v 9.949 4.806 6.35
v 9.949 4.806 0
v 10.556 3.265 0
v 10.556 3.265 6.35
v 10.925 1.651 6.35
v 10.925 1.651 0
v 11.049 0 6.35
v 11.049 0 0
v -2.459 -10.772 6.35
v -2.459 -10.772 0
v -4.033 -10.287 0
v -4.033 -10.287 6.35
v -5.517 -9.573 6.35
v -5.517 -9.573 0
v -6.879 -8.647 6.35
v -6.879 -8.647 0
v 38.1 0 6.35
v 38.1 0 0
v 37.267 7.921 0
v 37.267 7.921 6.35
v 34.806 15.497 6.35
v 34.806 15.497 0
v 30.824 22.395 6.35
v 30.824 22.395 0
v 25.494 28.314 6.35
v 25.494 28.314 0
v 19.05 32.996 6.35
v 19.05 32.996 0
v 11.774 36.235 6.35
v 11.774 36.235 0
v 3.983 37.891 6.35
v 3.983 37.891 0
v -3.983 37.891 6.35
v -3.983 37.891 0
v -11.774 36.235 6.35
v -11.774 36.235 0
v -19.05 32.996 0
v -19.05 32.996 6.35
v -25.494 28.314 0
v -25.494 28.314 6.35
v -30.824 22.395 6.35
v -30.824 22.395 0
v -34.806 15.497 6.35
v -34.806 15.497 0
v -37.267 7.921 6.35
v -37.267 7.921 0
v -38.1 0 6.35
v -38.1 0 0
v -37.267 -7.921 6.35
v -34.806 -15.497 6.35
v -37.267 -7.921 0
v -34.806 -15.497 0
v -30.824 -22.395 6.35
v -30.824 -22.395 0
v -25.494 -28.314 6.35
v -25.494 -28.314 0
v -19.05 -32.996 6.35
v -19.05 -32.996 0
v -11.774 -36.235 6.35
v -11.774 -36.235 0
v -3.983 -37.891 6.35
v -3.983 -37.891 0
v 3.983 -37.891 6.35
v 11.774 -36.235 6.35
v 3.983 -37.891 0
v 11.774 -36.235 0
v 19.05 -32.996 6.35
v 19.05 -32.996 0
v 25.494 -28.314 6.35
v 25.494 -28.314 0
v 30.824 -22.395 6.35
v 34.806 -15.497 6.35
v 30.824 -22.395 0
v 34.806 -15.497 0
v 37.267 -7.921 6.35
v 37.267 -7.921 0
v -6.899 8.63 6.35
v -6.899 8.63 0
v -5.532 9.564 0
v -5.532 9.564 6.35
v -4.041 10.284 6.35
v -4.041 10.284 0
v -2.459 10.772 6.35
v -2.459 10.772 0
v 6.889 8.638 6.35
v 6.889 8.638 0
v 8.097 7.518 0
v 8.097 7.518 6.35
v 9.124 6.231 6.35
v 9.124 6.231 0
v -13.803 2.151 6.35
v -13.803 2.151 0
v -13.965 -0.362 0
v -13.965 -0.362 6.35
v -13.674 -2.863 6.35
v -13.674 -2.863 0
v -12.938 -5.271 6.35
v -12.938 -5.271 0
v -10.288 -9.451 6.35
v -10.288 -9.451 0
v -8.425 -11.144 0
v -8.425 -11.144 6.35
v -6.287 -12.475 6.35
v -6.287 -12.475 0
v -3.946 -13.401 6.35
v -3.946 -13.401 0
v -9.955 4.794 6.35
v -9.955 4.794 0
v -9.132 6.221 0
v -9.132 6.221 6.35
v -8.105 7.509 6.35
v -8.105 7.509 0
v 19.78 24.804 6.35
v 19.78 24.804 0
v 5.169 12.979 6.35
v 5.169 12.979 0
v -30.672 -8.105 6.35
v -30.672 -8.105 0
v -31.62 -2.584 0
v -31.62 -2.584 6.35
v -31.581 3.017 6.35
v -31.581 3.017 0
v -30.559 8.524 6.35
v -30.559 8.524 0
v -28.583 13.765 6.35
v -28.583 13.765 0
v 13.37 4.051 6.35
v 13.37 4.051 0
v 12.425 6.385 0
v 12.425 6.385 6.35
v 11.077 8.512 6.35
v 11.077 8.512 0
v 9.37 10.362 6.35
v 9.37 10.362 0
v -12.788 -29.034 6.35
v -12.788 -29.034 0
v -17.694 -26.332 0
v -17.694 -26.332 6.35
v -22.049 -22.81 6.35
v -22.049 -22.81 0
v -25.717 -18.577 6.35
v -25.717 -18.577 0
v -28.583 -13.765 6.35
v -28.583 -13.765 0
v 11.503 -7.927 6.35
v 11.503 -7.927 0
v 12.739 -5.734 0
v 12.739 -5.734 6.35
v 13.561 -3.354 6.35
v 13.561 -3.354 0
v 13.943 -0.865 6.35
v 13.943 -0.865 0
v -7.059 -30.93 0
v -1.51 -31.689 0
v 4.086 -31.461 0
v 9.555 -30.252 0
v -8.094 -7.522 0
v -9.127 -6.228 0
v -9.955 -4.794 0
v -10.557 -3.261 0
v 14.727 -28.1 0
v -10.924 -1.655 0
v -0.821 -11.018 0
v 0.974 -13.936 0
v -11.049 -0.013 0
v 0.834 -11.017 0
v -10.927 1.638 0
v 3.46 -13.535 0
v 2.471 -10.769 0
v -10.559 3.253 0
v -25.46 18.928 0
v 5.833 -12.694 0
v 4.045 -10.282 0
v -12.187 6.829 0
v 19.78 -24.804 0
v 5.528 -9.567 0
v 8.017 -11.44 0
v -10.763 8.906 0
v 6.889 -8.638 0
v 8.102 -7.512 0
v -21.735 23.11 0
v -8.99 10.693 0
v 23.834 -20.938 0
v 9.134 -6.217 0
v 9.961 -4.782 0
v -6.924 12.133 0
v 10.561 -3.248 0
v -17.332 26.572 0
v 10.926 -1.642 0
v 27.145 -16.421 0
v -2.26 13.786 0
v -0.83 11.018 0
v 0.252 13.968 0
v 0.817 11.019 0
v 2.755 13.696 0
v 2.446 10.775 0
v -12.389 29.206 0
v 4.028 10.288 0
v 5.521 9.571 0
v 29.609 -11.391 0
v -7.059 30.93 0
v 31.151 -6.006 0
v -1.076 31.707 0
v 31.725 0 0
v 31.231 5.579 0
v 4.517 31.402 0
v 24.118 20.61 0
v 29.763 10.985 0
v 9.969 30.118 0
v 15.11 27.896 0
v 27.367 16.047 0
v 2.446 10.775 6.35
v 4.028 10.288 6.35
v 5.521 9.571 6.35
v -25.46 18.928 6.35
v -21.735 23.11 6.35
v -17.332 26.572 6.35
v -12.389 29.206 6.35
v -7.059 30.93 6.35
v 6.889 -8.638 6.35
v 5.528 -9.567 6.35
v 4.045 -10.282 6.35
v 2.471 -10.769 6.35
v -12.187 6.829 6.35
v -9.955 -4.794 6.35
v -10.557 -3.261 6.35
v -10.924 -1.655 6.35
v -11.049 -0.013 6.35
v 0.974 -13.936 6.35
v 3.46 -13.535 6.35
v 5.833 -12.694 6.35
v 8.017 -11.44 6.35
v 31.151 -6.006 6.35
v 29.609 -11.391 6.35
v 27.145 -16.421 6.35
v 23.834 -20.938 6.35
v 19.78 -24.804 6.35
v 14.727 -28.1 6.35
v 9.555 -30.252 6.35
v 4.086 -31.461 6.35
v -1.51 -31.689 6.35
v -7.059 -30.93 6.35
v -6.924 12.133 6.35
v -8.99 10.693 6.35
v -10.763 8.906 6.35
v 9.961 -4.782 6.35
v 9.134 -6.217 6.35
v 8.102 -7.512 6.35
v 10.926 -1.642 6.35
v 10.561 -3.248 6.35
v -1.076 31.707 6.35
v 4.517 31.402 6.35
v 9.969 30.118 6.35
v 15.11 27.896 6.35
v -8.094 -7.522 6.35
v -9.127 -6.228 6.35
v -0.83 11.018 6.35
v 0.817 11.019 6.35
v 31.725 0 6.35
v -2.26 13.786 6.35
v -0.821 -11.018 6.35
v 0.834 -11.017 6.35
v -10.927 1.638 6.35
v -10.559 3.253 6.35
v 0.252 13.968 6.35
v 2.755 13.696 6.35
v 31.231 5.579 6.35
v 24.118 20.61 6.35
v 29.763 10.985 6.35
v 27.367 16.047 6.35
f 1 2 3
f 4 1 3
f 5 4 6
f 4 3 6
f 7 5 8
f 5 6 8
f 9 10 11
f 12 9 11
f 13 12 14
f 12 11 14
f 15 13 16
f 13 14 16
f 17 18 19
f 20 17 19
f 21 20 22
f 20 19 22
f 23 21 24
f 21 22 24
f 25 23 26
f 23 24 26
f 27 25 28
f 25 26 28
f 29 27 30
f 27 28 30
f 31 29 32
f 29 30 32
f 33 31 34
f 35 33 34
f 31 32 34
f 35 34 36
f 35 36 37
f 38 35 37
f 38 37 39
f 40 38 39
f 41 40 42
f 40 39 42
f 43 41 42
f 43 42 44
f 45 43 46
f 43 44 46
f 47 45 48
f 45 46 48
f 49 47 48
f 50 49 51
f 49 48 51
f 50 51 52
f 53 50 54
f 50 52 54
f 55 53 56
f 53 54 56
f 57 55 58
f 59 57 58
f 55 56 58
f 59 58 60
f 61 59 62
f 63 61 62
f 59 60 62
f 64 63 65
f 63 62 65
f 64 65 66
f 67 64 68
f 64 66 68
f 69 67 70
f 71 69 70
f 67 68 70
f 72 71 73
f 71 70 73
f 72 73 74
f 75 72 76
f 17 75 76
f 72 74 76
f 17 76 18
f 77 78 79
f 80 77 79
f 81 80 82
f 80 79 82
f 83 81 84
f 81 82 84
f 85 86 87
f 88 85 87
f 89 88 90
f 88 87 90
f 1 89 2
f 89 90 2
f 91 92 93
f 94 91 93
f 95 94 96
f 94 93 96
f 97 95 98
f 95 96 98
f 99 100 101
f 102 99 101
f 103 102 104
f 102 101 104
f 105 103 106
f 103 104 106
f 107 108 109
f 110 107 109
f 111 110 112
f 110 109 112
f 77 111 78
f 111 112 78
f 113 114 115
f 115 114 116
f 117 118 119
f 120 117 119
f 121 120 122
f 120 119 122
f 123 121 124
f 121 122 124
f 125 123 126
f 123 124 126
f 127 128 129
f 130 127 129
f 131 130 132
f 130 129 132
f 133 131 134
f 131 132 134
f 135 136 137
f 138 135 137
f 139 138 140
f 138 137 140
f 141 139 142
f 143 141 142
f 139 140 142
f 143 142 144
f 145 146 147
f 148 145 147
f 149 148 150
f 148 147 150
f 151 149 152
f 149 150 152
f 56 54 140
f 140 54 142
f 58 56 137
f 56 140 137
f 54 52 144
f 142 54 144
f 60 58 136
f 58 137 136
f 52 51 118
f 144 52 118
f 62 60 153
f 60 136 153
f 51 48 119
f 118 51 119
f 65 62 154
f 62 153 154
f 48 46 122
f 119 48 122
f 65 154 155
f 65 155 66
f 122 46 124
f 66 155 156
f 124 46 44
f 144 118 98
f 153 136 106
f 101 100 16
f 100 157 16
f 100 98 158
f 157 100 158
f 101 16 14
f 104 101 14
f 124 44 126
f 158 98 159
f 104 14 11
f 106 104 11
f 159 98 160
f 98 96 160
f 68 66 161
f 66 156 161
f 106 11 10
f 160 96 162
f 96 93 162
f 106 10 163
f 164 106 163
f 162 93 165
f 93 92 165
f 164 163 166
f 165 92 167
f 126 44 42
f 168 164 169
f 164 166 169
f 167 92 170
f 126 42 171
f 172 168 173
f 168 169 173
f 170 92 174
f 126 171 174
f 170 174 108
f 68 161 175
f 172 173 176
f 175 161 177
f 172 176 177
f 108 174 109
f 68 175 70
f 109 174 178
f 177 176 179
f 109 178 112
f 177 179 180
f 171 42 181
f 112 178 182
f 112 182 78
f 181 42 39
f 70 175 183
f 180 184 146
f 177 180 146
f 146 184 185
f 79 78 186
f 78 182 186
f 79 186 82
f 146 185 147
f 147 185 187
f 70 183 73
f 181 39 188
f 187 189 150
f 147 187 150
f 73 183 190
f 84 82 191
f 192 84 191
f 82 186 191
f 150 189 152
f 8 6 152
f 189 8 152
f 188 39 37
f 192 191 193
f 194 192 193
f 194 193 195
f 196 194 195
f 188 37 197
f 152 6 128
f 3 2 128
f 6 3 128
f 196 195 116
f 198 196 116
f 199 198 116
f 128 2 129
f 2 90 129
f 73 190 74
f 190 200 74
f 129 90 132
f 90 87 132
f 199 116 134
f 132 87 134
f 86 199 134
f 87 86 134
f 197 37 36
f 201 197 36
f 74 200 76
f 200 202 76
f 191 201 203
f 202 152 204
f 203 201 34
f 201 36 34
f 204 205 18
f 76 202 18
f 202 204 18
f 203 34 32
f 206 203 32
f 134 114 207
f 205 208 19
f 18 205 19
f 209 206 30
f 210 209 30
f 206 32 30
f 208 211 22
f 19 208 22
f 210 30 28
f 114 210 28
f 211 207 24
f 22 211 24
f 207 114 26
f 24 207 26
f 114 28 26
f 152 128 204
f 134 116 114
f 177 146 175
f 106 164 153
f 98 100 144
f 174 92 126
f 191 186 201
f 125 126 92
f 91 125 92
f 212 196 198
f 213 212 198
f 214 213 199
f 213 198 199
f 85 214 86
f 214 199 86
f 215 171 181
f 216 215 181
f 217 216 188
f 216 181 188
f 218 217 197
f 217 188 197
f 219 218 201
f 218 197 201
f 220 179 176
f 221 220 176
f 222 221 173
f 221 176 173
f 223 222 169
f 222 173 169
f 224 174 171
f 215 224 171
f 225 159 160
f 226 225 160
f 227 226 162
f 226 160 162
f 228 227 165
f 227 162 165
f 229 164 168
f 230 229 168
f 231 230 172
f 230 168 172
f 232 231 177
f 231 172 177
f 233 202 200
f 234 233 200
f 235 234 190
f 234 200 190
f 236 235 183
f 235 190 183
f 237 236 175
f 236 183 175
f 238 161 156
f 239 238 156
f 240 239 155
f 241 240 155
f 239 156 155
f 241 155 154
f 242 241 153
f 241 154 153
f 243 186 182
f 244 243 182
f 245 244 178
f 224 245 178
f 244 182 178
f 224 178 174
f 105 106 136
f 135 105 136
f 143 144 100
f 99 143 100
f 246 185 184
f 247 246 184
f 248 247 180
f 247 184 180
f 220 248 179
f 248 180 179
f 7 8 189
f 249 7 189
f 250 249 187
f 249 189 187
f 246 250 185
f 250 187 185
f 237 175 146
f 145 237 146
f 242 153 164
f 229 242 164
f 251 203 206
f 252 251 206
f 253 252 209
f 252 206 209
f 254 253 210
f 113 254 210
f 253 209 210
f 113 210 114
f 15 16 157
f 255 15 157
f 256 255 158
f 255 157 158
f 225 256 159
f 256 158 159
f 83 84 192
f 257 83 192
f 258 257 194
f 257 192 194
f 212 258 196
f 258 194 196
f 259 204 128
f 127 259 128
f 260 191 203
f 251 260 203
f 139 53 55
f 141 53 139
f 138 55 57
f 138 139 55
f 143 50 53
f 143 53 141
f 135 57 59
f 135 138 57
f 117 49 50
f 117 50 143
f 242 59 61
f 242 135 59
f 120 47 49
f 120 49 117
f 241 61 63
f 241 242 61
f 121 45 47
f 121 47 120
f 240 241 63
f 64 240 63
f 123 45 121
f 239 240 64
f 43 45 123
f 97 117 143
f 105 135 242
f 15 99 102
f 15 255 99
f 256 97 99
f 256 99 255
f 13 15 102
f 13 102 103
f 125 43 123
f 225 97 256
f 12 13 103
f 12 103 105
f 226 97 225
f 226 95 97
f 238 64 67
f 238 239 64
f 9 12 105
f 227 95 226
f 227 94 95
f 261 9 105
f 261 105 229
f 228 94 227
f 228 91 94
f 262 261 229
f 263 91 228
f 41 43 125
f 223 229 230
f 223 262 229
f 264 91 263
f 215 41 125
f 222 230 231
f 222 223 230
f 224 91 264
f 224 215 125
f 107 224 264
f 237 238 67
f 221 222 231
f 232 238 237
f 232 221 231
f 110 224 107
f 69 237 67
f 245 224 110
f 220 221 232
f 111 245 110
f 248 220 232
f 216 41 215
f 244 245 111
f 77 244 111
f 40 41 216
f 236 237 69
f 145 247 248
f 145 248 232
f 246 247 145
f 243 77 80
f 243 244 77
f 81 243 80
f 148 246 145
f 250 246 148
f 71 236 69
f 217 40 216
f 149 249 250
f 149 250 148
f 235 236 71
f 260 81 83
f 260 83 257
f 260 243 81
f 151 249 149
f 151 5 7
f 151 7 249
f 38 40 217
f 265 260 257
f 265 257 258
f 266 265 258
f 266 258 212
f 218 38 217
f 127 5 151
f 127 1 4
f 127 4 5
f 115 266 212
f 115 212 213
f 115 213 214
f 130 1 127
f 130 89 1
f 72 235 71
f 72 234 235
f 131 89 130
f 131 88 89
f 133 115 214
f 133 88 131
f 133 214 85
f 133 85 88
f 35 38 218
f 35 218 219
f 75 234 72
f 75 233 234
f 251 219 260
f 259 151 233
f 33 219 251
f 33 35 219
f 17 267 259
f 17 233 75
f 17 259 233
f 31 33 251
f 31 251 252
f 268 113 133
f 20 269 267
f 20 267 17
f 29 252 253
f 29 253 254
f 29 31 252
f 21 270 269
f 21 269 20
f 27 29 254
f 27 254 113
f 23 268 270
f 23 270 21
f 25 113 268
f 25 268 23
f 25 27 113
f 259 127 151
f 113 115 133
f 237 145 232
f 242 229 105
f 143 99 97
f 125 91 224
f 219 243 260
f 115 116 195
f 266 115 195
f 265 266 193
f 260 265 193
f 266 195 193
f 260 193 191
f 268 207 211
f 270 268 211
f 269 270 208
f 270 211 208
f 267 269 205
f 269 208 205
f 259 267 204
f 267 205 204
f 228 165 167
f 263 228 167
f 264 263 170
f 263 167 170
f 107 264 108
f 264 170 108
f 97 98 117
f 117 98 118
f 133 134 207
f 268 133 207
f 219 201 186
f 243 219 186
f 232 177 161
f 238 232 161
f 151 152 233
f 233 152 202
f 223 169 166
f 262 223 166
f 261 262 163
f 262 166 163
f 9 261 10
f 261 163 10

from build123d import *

# Parameters (mm, degrees)
F0_R     = 38.1
F1_DEPTH = 6.35


with BuildPart() as f1:
    # F0 (on Top) → F1 (new body)
    with BuildSketch(Plane.XY):
        Circle(F0_R)
        with BuildLine():
            ThreePointArc((31.7250303997, 0), (31.5812646245, -3.0168325409), (31.1512702825, -6.0063228058))
            ThreePointArc((31.1512702825, -6.0063228058), (27.1447816525, -16.4206693804), (19.7802329179, -24.8036275488))
            ThreePointArc((19.7802329179, -24.8036275488), (17.3319417654, -26.5721912628), (14.7265670727, -28.0999248419))
            ThreePointArc((14.7265670727, -28.0999248419), (4.0862982493, -31.460764779), (-7.0594833943, -30.9296176515))
            ThreePointArc((-7.0594833943, -30.9296176515), (-9.9686867503, -30.1181479898), (-12.7875415101, -29.033710338))
            ThreePointArc((-12.7875415101, -29.033710338), (-22.049251081, -22.8102626164), (-28.5832647234, -13.7649748135))
            ThreePointArc((-28.5832647234, -13.7649748135), (-29.7626908188, -10.9845249823), (-30.6723705175, -8.1045197699))
            ThreePointArc((-30.6723705175, -8.1045197699), (-31.5812646245, 3.0168325409), (-28.5832647234, 13.7649748135))
            ThreePointArc((-28.5832647234, 13.7649748135), (-27.1447816525, 16.4206693804), (-25.4602789229, 18.9275394871))
            ThreePointArc((-25.4602789229, 18.9275394871), (-17.3319417654, 26.5721912628), (-7.0594833943, 30.9296176515))
            ThreePointArc((-7.0594833943, 30.9296176515), (-4.0862982493, 31.460764779), (-1.0760780042, 31.7067754588))
            ThreePointArc((-1.0760780042, 31.7067754588), (9.9686867503, 30.1181479898), (19.7802329179, 24.8036275488))
            ThreePointArc((19.7802329179, 24.8036275488), (22.049251081, 22.8102626164), (24.1184315996, 20.6101628097))
            ThreePointArc((24.1184315996, 20.6101628097), (29.7626908188, 10.9845249823), (31.7250303997, 0))
        make_face(mode=Mode.SUBTRACT)
        with BuildLine():
            Line((-10.2881439148, -9.4506610768), (-6.878658835, -8.6466440676))
            ThreePointArc((-6.878658835, -8.6466440676), (-8.634357457, -6.8940751595), (-9.9548050215, -4.7939814335))
            Line((-9.9548050215, -4.7939814335), (-12.9376014162, -5.270613778))
            ThreePointArc((-12.9376014162, -5.270613778), (-11.7994495804, -7.4788962822), (-10.2881439148, -9.4506610768))
        make_face()
        with BuildLine():
            Line((-28.5832647234, -13.7649748135), (-10.2881439148, -9.4506610768))
            ThreePointArc((-10.2881439148, -9.4506610768), (-11.7994495804, -7.4788962822), (-12.9376014162, -5.270613778))
            Line((-12.9376014162, -5.270613778), (-30.6723705175, -8.1045197699))
            ThreePointArc((-30.6723705175, -8.1045197699), (-29.7626908188, -10.9845249823), (-28.5832647234, -13.7649748135))
        make_face()
        with BuildLine():
            ThreePointArc((-11.0489921838, -0.0131423621), (-10.7734388222, 2.4522269355), (-9.9548050215, 4.7939814335))
            Line((-9.9548050215, 4.7939814335), (-12.187194327, 6.8288501547))
            ThreePointArc((-12.187194327, 6.8288501547), (-13.2040730485, 4.5621655966), (-13.8033771709, 2.1512040066))
            Line((-13.8033771709, 2.1512040066), (-11.0489921838, -0.0131423621))
        make_face()
        with BuildLine():
            ThreePointArc((-13.8033771709, 2.1512040066), (-13.2040730485, 4.5621655966), (-12.187194327, 6.8288501547))
            Line((-12.187194327, 6.8288501547), (-25.4602789229, 18.9275394871))
            ThreePointArc((-25.4602789229, 18.9275394871), (-27.1447816525, 16.4206693804), (-28.5832647234, 13.7649748135))
            Line((-28.5832647234, 13.7649748135), (-13.8033771709, 2.1512040066))
        make_face()
        with BuildLine():
            ThreePointArc((-6.8992090599, 8.6302558101), (-4.7999010163, 9.9519521318), (-2.4586337993, 10.7719785017))
            Line((-2.4586337993, 10.7719785017), (-2.2595813362, 13.7860506377))
            ThreePointArc((-2.2595813362, 13.7860506377), (-4.665760197, 13.16782373), (-6.9243858797, 12.1331685964))
            Line((-6.9243858797, 12.1331685964), (-6.8992090599, 8.6302558101))
        make_face()
        with BuildLine():
            ThreePointArc((-6.9243858797, 12.1331685964), (-4.665760197, 13.16782373), (-2.2595813362, 13.7860506377))
            Line((-2.2595813362, 13.7860506377), (-1.0760780042, 31.7067754588))
            ThreePointArc((-1.0760780042, 31.7067754588), (-4.0862982493, 31.460764779), (-7.0594833943, 30.9296176515))
            Line((-7.0594833943, 30.9296176515), (-6.9243858797, 12.1331685964))
        make_face()
        with BuildLine():
            ThreePointArc((2.4458192044, 10.7748953322), (4.7880601551, 9.95765439), (6.8889388207, 8.6384560498))
            Line((6.8889388207, 8.6384560498), (9.3695424879, 10.3620738064))
            ThreePointArc((9.3695424879, 10.3620738064), (7.3859652469, 11.85784202), (5.1688092106, 12.9786097616))
            Line((5.1688092106, 12.9786097616), (2.4458192044, 10.7748953322))
        make_face()
        with BuildLine():
            ThreePointArc((5.1688092106, 12.9786097616), (7.3859652469, 11.85784202), (9.3695424879, 10.3620738064))
            Line((9.3695424879, 10.3620738064), (24.1184315996, 20.6101628097))
            ThreePointArc((24.1184315996, 20.6101628097), (22.049251081, 22.8102626164), (19.7802329179, 24.8036275488))
            Line((19.7802329179, 24.8036275488), (5.1688092106, 12.9786097616))
        make_face()
        with BuildLine():
            ThreePointArc((9.9490957221, 4.8058189013), (10.770514371, 2.4650397934), (11.049, 0))
            Line((11.049, 0), (13.9432097147, -0.864755949))
            ThreePointArc((13.9432097147, -0.864755949), (13.9633008224, -0.4325854166), (13.97, 0))
            ThreePointArc((13.97, 0), (13.8191317384, 2.0475590338), (13.3697855409, 4.0508930609))
            Line((13.3697855409, 4.0508930609), (9.9490957221, 4.8058189013))
        make_face()
        with BuildLine():
            ThreePointArc((13.97, 0), (13.9633008224, -0.4325854166), (13.9432097147, -0.864755949))
            Line((13.9432097147, -0.864755949), (31.1512702825, -6.0063228058))
            ThreePointArc((31.1512702825, -6.0063228058), (31.5812646245, -3.0168325409), (31.7250303997, 0))
            Line((31.7250303997, 0), (13.3697855409, 4.0508930609))
            ThreePointArc((13.3697855409, 4.0508930609), (13.8191317384, 2.0475590338), (13.97, 0))
        make_face()
        with BuildLine():
            Line((11.5030406649, -7.9272287378), (9.9605002365, -4.7821371831))
            ThreePointArc((9.9605002365, -4.7821371831), (8.6425515871, -6.8838000453), (6.8889388207, -8.6384560498))
            Line((6.8889388207, -8.6384560498), (8.0173556368, -11.4404068369))
            ThreePointArc((8.0173556368, -11.4404068369), (9.9170092786, -9.8394017586), (11.5030406649, -7.9272287378))
        make_face()
        with BuildLine():
            Line((19.7802329179, -24.8036275488), (11.5030406649, -7.9272287378))
            ThreePointArc((11.5030406649, -7.9272287378), (9.9170092786, -9.8394017586), (8.0173556368, -11.4404068369))
            Line((8.0173556368, -11.4404068369), (14.7265670727, -28.0999248419))
            ThreePointArc((14.7265670727, -28.0999248419), (17.3319417654, -26.5721912628), (19.7802329179, -24.8036275488))
        make_face()
        with BuildLine():
            Line((0.974271549, -13.935985611), (2.4714449156, -10.7690464308))
            ThreePointArc((2.4714449156, -10.7690464308), (0.0065711822, -11.048998046), (-2.4586337993, -10.7719785017))
            Line((-2.4586337993, -10.7719785017), (-3.9457307599, -13.4011980349))
            ThreePointArc((-3.9457307599, -13.4011980349), (-1.5095999134, -13.8881967189), (0.974271549, -13.935985611))
        make_face()
        with BuildLine():
            Line((-7.0594833943, -30.9296176515), (0.974271549, -13.935985611))
            ThreePointArc((0.974271549, -13.935985611), (-1.5095999134, -13.8881967189), (-3.9457307599, -13.4011980349))
            Line((-3.9457307599, -13.4011980349), (-12.7875415101, -29.033710338))
            ThreePointArc((-12.7875415101, -29.033710338), (-9.9686867503, -30.1181479898), (-7.0594833943, -30.9296176515))
        make_face()
        with BuildLine():
            ThreePointArc((-9.9548050215, 4.7939814335), (-8.6425515871, 6.8838000453), (-6.8992090599, 8.6302558101))
            Line((-6.8992090599, 8.6302558101), (-6.9243858797, 12.1331685964))
            ThreePointArc((-6.9243858797, 12.1331685964), (-9.9170092786, 9.8394017586), (-12.187194327, 6.8288501547))
            Line((-12.187194327, 6.8288501547), (-9.9548050215, 4.7939814335))
        make_face()
        with BuildLine():
            Line((-12.9376014162, -5.270613778), (-9.9548050215, -4.7939814335))
            ThreePointArc((-9.9548050215, -4.7939814335), (-10.770514371, -2.4650397934), (-11.0489921838, -0.0131423621))
            Line((-11.0489921838, -0.0131423621), (-13.8033771709, 2.1512040066))
            ThreePointArc((-13.8033771709, 2.1512040066), (-13.8759082137, -1.6186634131), (-12.9376014162, -5.270613778))
        make_face()
        with BuildLine():
            Line((-3.9457307599, -13.4011980349), (-2.4586337993, -10.7719785017))
            ThreePointArc((-2.4586337993, -10.7719785017), (-4.7880601551, -9.95765439), (-6.878658835, -8.6466440676))
            Line((-6.878658835, -8.6466440676), (-10.2881439148, -9.4506610768))
            ThreePointArc((-10.2881439148, -9.4506610768), (-7.3859652469, -11.85784202), (-3.9457307599, -13.4011980349))
        make_face()
        with BuildLine():
            Line((8.0173556368, -11.4404068369), (6.8889388207, -8.6384560498))
            ThreePointArc((6.8889388207, -8.6384560498), (4.7999010163, -9.9519521318), (2.4714449156, -10.7690464308))
            Line((2.4714449156, -10.7690464308), (0.974271549, -13.935985611))
            ThreePointArc((0.974271549, -13.935985611), (4.665760197, -13.16782373), (8.0173556368, -11.4404068369))
        make_face()
        with BuildLine():
            Line((13.9432097147, -0.864755949), (11.049, 0))
            ThreePointArc((11.049, 0), (10.7734388222, -2.4522269355), (9.9605002365, -4.7821371831))
            Line((9.9605002365, -4.7821371831), (11.5030406649, -7.9272287378))
            ThreePointArc((11.5030406649, -7.9272287378), (13.2040730485, -4.5621655966), (13.9432097147, -0.864755949))
        make_face()
        with BuildLine():
            ThreePointArc((6.8889388207, 8.6384560498), (8.634357457, 6.8940751595), (9.9490957221, 4.8058189013))
            Line((9.9490957221, 4.8058189013), (13.3697855409, 4.0508930609))
            ThreePointArc((13.3697855409, 4.0508930609), (11.7994495804, 7.4788962822), (9.3695424879, 10.3620738064))
            Line((9.3695424879, 10.3620738064), (6.8889388207, 8.6384560498))
        make_face()
        with BuildLine():
            ThreePointArc((-2.4586337993, 10.7719785017), (-0.0065711822, 11.048998046), (2.4458192044, 10.7748953322))
            Line((2.4458192044, 10.7748953322), (5.1688092106, 12.9786097616))
            ThreePointArc((5.1688092106, 12.9786097616), (1.5095999134, 13.8881967189), (-2.2595813362, 13.7860506377))
            Line((-2.2595813362, 13.7860506377), (-2.4586337993, 10.7719785017))
        make_face()
    extrude(amount=F1_DEPTH)


solid = f1.part
